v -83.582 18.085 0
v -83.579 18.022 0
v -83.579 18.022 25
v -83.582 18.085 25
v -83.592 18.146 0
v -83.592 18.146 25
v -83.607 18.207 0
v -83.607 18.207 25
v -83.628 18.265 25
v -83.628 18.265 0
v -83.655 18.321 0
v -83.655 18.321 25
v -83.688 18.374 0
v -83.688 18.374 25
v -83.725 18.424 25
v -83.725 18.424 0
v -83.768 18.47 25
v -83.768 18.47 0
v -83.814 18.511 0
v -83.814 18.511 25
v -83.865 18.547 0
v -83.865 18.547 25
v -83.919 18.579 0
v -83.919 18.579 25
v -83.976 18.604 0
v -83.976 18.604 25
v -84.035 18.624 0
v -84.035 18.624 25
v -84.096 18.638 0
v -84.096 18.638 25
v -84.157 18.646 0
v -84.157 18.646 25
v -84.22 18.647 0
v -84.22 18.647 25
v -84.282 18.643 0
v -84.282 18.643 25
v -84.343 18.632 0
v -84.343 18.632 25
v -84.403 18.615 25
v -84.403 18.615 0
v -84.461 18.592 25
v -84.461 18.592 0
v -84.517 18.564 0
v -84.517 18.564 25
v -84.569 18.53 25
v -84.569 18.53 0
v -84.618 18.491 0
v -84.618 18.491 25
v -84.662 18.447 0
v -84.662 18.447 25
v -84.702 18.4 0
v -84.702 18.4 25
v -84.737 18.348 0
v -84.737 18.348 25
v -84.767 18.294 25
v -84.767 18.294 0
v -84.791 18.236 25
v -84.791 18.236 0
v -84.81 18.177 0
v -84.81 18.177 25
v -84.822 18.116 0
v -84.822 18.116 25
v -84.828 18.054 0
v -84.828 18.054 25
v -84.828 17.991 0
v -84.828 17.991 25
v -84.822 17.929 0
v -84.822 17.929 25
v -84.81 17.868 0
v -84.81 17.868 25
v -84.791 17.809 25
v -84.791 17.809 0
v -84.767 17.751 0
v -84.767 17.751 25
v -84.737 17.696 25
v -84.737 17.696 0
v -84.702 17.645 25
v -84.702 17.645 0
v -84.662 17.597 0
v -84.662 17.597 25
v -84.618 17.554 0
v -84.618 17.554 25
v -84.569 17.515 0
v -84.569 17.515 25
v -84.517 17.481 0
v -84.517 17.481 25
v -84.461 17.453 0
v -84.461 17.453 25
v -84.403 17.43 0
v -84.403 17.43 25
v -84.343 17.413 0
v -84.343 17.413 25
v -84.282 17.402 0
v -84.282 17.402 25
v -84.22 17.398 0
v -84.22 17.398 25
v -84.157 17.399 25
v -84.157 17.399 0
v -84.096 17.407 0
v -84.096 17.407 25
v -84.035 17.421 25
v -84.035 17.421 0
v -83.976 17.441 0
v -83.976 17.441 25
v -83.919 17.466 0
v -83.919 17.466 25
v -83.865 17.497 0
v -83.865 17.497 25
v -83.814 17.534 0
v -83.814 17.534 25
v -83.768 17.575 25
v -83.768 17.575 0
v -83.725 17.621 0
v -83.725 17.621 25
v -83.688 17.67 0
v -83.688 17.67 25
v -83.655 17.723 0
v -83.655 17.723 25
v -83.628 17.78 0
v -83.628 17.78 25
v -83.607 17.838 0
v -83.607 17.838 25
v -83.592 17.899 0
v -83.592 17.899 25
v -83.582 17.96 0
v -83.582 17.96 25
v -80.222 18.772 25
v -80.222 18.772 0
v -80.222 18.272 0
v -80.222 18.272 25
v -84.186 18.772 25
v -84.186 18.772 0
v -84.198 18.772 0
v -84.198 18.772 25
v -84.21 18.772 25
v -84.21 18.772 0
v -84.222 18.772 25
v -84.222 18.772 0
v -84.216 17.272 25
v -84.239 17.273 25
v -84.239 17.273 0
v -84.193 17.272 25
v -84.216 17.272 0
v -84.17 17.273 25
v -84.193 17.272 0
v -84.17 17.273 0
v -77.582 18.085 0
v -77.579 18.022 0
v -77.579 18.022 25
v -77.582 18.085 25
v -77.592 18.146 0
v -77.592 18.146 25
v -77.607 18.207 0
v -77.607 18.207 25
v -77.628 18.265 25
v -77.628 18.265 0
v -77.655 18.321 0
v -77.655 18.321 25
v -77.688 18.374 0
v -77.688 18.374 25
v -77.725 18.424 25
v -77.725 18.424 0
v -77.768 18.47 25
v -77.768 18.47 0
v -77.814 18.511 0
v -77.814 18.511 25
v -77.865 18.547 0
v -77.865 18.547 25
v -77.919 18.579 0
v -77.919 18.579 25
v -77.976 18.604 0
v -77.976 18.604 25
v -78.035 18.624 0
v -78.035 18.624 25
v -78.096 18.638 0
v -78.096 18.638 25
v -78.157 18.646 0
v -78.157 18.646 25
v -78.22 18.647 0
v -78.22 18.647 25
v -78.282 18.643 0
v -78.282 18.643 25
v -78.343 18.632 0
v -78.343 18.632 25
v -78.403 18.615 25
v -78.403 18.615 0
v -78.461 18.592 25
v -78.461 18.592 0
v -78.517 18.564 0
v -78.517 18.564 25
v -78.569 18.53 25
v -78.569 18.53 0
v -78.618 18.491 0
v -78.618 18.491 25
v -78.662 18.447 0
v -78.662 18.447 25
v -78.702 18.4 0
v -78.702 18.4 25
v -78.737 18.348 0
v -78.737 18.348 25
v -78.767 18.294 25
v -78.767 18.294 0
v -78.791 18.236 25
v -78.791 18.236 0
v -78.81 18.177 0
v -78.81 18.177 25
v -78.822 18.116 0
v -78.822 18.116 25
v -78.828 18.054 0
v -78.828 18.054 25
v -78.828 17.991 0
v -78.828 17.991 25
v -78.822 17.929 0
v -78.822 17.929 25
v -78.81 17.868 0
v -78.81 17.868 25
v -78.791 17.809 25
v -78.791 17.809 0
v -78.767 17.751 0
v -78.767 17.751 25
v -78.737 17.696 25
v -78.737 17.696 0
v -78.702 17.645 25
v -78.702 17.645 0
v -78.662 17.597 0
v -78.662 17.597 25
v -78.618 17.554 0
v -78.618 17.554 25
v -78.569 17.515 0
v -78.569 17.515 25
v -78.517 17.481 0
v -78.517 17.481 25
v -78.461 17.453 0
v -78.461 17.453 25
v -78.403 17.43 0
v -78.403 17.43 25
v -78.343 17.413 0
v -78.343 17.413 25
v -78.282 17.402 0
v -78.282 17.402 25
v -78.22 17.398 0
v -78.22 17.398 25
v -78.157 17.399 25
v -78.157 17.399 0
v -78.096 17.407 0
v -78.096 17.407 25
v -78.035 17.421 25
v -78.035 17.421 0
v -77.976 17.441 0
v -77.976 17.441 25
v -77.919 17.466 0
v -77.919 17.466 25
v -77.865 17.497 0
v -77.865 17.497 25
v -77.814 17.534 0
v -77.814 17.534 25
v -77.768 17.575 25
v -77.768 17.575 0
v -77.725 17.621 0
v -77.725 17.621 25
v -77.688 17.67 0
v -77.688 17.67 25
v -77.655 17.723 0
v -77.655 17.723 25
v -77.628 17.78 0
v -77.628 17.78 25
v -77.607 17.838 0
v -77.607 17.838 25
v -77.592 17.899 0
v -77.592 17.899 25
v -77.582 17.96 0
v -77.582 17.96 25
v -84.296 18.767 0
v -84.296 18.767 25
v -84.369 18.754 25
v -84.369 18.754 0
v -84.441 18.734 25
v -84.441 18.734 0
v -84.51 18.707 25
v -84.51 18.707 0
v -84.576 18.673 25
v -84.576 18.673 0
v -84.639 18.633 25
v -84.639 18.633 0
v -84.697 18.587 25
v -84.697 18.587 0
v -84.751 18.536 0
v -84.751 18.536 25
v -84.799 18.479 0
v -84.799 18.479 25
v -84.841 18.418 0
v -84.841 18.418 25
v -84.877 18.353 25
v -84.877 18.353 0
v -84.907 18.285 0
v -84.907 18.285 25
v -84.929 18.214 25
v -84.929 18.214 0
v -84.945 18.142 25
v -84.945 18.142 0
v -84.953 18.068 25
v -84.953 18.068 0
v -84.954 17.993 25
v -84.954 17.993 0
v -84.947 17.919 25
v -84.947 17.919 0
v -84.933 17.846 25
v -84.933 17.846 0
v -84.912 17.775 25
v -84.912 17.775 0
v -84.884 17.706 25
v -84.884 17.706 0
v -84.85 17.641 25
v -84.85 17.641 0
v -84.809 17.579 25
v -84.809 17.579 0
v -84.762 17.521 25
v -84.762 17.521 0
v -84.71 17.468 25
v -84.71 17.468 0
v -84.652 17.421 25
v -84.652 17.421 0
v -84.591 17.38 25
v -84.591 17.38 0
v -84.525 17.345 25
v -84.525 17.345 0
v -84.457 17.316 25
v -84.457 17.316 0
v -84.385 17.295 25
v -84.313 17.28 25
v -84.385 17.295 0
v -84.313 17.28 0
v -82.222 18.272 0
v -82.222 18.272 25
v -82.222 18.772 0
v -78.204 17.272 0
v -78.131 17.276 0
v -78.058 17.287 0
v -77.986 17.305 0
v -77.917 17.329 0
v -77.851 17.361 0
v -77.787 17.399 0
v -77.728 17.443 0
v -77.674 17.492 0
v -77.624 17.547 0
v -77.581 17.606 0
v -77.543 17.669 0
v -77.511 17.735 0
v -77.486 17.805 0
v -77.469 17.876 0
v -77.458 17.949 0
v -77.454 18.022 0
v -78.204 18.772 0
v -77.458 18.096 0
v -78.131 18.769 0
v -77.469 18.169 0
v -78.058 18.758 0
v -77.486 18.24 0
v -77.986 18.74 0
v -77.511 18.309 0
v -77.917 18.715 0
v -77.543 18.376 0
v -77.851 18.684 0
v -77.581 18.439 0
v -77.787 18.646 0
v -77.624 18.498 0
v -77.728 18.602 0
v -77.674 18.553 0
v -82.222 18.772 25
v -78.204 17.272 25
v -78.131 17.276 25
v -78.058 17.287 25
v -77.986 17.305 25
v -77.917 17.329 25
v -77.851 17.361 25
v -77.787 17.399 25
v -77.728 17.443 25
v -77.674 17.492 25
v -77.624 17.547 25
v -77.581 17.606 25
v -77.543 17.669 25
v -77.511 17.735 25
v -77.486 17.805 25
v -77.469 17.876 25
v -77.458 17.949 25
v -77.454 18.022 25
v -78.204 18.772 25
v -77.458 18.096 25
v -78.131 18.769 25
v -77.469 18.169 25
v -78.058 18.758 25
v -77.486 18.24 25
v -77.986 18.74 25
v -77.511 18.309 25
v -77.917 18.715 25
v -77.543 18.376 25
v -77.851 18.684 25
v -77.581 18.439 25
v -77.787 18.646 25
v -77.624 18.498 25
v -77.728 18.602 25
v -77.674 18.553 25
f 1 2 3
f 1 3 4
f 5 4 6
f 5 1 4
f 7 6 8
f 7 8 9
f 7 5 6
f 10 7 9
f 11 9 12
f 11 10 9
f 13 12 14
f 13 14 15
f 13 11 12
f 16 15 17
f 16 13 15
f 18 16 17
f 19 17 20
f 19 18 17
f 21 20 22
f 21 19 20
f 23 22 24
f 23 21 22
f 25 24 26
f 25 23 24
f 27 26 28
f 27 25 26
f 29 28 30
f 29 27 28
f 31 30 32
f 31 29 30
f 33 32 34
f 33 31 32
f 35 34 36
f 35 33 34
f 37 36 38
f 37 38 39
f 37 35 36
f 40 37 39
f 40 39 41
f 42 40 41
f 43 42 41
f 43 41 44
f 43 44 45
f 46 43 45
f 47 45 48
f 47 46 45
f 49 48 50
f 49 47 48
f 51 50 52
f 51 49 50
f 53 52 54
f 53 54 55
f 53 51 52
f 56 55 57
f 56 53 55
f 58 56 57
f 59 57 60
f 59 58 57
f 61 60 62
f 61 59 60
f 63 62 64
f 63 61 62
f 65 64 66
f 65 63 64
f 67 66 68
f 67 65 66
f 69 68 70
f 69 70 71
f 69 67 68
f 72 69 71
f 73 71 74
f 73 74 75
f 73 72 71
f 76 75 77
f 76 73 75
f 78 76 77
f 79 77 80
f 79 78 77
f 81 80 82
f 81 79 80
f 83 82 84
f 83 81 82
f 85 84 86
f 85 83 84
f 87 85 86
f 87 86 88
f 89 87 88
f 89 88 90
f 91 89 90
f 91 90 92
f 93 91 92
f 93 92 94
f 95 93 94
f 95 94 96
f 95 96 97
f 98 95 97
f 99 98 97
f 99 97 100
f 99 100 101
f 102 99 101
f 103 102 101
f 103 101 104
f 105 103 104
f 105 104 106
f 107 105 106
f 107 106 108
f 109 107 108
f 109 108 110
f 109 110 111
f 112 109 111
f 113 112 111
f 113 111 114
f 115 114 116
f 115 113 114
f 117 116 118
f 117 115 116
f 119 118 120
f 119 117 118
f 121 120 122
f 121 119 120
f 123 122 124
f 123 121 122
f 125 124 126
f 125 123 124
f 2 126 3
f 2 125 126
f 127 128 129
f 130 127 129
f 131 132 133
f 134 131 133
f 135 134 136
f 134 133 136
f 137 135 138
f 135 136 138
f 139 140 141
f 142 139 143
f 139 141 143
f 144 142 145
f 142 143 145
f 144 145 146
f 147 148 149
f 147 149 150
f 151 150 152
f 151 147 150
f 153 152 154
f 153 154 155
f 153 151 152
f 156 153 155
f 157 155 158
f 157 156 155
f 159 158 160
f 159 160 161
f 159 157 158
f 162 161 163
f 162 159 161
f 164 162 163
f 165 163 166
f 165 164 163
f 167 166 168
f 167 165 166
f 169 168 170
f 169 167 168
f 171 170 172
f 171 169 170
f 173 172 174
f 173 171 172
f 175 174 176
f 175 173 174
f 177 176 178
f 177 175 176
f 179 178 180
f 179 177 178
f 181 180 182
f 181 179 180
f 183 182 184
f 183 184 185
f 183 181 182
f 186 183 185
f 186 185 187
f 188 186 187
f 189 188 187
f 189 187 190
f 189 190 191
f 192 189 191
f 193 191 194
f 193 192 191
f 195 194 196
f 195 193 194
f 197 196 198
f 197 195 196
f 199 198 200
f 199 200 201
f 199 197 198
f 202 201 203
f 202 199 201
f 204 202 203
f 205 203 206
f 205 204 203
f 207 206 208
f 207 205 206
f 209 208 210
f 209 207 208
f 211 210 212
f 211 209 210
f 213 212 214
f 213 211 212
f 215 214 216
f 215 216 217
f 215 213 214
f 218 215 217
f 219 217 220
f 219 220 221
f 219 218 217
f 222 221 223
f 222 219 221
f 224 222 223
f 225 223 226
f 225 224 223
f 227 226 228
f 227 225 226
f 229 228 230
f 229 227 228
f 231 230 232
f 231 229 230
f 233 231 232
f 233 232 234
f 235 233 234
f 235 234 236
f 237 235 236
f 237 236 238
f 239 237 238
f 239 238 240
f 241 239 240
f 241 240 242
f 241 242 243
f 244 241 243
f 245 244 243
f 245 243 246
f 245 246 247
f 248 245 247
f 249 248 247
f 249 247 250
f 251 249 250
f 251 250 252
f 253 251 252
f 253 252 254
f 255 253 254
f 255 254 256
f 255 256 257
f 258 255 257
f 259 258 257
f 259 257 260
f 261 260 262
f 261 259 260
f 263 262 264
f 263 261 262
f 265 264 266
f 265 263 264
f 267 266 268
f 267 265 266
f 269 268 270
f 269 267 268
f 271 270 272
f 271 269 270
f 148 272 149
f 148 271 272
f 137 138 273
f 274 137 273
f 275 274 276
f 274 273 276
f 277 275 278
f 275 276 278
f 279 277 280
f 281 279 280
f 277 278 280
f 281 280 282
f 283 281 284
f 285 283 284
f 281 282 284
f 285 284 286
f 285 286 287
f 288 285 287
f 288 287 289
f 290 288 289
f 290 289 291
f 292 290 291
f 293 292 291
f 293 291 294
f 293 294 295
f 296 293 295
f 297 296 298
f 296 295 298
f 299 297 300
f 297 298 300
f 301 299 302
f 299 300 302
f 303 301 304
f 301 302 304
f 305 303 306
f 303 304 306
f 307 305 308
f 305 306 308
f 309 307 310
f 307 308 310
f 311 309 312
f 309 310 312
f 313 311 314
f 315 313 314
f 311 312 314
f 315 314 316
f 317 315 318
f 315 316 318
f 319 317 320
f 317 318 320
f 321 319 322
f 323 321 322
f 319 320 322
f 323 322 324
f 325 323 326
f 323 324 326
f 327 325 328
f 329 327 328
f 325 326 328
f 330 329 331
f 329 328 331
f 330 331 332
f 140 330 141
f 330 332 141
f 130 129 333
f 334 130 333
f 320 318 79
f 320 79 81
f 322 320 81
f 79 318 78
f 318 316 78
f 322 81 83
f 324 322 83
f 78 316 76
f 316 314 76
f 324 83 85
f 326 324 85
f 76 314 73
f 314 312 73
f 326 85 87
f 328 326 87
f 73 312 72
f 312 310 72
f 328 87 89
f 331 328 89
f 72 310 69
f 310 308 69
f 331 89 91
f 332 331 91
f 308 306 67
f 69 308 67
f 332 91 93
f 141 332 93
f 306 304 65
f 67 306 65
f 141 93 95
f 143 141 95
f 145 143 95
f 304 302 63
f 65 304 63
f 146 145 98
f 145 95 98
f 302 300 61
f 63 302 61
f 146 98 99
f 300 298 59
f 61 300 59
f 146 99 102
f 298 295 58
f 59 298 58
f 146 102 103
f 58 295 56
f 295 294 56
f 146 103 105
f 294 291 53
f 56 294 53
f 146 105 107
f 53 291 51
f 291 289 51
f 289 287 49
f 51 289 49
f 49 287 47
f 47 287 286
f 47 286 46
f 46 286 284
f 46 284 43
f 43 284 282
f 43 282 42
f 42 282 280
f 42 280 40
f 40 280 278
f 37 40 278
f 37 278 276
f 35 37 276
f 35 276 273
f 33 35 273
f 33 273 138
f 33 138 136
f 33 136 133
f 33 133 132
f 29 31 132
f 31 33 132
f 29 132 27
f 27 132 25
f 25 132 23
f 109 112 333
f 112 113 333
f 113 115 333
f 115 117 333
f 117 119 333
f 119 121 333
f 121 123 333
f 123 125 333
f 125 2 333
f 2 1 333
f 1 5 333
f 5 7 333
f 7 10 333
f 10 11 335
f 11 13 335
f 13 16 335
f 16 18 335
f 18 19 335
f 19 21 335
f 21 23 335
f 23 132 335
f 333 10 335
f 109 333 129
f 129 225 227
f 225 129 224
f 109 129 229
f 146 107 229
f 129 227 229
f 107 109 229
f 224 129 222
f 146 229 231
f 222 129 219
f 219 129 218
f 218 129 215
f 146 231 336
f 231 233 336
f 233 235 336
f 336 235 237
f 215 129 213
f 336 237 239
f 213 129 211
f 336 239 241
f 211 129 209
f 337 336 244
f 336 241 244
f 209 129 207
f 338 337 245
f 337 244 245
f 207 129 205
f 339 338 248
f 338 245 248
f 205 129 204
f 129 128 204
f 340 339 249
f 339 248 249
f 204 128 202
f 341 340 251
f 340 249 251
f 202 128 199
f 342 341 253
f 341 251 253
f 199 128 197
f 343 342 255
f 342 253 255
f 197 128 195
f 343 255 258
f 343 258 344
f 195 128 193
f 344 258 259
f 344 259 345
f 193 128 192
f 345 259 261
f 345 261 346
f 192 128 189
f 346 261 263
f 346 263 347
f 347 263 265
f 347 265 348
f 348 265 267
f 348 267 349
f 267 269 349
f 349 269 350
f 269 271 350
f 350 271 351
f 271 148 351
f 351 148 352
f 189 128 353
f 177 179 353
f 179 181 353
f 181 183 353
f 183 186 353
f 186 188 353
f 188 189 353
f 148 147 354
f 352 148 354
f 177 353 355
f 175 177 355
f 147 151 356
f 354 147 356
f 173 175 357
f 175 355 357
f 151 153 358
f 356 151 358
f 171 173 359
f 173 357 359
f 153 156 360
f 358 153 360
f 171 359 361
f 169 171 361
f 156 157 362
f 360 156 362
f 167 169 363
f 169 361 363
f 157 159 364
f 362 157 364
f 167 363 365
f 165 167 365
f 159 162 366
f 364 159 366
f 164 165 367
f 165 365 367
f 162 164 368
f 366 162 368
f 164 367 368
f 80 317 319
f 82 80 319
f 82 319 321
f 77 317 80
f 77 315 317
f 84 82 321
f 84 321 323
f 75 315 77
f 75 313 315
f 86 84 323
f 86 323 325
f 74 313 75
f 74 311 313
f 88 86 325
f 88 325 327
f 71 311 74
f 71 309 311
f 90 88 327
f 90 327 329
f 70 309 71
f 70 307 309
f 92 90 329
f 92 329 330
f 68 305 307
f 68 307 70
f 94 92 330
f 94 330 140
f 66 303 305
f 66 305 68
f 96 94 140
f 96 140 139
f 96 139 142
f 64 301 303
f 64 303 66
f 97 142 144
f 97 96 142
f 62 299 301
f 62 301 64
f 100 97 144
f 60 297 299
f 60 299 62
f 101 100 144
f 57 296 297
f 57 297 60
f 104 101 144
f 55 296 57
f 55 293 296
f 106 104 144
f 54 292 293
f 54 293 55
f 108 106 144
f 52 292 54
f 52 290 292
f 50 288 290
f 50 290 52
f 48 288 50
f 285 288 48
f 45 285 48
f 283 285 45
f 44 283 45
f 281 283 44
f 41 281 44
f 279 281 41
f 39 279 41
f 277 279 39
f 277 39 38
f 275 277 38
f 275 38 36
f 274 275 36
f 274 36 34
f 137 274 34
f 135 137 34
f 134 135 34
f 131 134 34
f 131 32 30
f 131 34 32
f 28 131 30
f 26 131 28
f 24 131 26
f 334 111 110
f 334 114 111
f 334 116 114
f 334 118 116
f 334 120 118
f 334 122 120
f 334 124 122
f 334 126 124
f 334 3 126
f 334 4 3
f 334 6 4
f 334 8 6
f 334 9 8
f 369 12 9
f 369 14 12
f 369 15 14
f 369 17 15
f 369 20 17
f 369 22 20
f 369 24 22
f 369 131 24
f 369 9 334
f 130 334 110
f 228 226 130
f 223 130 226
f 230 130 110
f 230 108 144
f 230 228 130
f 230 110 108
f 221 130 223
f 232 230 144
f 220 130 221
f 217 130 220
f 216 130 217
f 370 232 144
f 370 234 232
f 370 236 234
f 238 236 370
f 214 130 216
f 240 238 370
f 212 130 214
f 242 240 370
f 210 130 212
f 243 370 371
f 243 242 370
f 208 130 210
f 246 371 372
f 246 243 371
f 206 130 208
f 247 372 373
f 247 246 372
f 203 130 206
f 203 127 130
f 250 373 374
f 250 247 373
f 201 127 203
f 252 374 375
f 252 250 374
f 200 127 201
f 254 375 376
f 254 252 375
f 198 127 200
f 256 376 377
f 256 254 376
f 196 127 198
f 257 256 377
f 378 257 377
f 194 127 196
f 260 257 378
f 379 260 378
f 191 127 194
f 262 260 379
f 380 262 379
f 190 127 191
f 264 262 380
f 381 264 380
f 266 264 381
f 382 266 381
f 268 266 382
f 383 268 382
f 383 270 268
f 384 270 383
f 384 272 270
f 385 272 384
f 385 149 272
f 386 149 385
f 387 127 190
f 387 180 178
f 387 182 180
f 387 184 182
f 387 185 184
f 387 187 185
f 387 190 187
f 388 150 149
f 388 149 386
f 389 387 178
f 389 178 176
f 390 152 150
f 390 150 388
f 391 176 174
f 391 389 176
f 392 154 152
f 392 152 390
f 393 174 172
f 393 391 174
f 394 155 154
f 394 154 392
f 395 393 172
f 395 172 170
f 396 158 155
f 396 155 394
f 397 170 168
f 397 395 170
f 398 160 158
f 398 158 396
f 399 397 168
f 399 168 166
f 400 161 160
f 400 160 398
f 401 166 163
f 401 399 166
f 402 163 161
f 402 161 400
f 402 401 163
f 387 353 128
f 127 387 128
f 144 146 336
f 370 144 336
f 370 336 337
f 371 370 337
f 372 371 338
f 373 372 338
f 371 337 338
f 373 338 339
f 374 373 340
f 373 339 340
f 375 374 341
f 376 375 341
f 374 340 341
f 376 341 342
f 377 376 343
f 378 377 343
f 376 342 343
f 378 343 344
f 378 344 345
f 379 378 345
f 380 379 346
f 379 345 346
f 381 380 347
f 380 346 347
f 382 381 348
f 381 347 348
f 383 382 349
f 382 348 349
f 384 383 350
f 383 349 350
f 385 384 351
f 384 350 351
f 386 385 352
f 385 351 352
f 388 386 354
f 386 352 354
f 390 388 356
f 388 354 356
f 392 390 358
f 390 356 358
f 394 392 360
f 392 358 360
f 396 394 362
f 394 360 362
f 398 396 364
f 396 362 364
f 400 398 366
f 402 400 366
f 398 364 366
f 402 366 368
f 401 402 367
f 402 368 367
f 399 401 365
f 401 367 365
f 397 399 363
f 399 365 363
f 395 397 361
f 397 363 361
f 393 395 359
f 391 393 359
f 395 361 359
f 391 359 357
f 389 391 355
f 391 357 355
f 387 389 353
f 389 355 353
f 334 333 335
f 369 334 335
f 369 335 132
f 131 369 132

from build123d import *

# Parameters (mm, degrees)
F0_R     = 0.625
F1_DEPTH = 25


with BuildPart() as f1:
    # F0 (on Top) → F1 (new body)
    with BuildSketch(Plane.XY):
        with BuildLine():
            Line((-84.169807, 17.273173), (-78.204214, 17.272388))
            ThreePointArc((-78.204214, 17.272388), (-77.454115, 18.022352), (-78.204142, 18.772388))
            Line((-78.204142, 18.772388), (-80.222164, 18.772315))
            Line((-80.222164, 18.772315), (-80.222146, 18.272315))
            Line((-80.222146, 18.272315), (-82.222146, 18.272243))
            Line((-82.222146, 18.272243), (-82.222164, 18.772243))
            Line((-82.222164, 18.772243), (-84.18612, 18.772172))
            Line((-84.18612, 18.772172), (-84.222164, 18.772171))
            ThreePointArc((-84.222164, 18.772171), (-84.95407, 18.030621), (-84.23862, 17.273182))
            Line((-84.23862, 17.273182), (-84.169807, 17.273173))
        make_face()
        with Locations((-84.204115, 18.022388)):
            Circle(F0_R, mode=Mode.SUBTRACT)
        with Locations((-78.204115, 18.022388)):
            Circle(F0_R, mode=Mode.SUBTRACT)
        with BuildLine():
            ThreePointArc((-84.23862, 17.273182), (-84.204214, 17.272388), (-84.169807, 17.273173))
            Line((-84.169807, 17.273173), (-84.23862, 17.273182))
        make_face()
        with BuildLine():
            ThreePointArc((-84.18612, 18.772172), (-84.204142, 18.772388), (-84.222164, 18.772171))
            Line((-84.222164, 18.772171), (-84.18612, 18.772172))
        make_face()
    extrude(amount=F1_DEPTH)


solid = f1.part
